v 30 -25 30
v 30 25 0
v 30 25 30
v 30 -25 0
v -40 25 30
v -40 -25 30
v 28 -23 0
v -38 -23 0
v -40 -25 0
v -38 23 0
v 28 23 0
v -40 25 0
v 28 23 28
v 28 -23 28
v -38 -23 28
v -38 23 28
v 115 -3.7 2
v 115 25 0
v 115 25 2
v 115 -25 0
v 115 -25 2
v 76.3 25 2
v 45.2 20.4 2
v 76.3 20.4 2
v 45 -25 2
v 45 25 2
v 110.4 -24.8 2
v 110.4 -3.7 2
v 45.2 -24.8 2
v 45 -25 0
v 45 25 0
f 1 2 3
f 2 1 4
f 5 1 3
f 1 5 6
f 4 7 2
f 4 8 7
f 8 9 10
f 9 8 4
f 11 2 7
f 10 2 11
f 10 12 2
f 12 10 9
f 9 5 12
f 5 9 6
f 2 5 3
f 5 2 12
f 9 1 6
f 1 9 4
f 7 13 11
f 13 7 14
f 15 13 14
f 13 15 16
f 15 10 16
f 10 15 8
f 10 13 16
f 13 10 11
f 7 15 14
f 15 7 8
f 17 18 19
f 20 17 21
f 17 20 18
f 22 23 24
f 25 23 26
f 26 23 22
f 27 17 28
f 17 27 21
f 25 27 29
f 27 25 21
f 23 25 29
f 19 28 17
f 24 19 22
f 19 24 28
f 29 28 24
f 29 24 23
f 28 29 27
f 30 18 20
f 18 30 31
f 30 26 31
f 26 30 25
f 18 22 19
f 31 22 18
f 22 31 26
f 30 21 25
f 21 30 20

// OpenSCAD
// Two-part enclosure for small electronics board
// Part 1: Box (left)
// Part 2: Lid (right, printed upside down)
// Prints together with a 10 mm gap.

// --- Dimensions ---
// Box Outer Dimensions (X x Y x Z)
$box_outer_x = 70;
$box_outer_y = 50;
$box_outer_z = 30;

// Wall and Floor Thickness
$wall_thickness = 2;
$floor_thickness = 2;

// Lid Dimensions
// Plate thickness
$plate_thickness = 2;
// Lip dimensions (height and wall thickness)
$lip_height = 4;
$lip_wall_thickness = 1.5;
// Lip outer size (X x Y)
$lip_outer_x = 65.6;
$lip_outer_y = 45.6;

// Clearance
$clearance = 0.2;

// Gap between parts
$gap = 10;

// --- Configuration ---
// Set global resolution for curved shapes
$fn = 64;

// --- Part 1: The Box ---
// Position: Centered on its own footprint, then shifted left by half gap
// Footprint: $box_outer_x * $box_outer_y
translate([-($gap/2) - ($box_outer_x/2), -($box_outer_y/2), 0])
difference() {
    // Outer Box
    cube([
        $box_outer_x, 
        $box_outer_y, 
        $box_outer_z
    ]);
    
    // Inner Void (to create walls and floor)
    // Inner X = Outer X - 2*Wall
    // Inner Y = Outer Y - 2*Wall
    // Inner Z = Outer Z - Floor (Top is open)
    translate([
        $wall_thickness, 
        $wall_thickness, 
        0
    ])
    cube([
        $box_outer_x - (2 * $wall_thickness),
        $box_outer_y - (2 * $wall_thickness),
        $box_outer_z - $floor_thickness
    ]);
}

// --- Part 2: The Lid ---
// Position: Centered on its own footprint (the Plate), then shifted right by half gap + box width
// Footprint: $box_outer_x * $box_outer_y (70 x 50)
// The lip (65.6 x 45.6) is centered within this plate.
translate([
    $gap + ($box_outer_x/2), 
    -($box_outer_y/2), // FIXED: Center based on Plate Y (50), not Lip Y (45.6)
    0
])
difference() {
    // 1. The Main Plate (70x50x2)
    cube([
        $box_outer_x, // 70
        $box_outer_y, // 50
        $plate_thickness // 2
    ]);
    
    // 2. The Lip Void
    // We need to remove the material inside the lip dimensions to create the hole.
    // Lip Outer: 65.6 x 45.6
    // Lip Wall: 1.5
    // Lip Height: 4
    
    // Calculate Lip Inner Dimensions
    $lip_inner_x = $lip_outer_x - (2 * $lip_wall_thickness);
    $lip_inner_y = $lip_outer_y - (2 * $lip_wall_thickness);
    
    // The void starts at Z = $plate_thickness and goes up by $lip_height
    translate([
        ($lip_outer_x/2) - $lip_wall_thickness, // Center X
        ($lip_outer_y/2) - $lip_wall_thickness, // Center Y
        $plate_thickness // Start at top of plate
    ])
    cube([
        $lip_inner_x,
        $lip_inner_y,
        $lip_height
    ]);
    
    // 3. Cut the Lip Wall Material (to make the hole round/clean and ensure fit)
    // We cut a shape slightly larger than the inner lip dimensions to ensure the 0.2mm clearance is respected
    // and the hole is clean.
    // Target inner size for the hole: Lip Outer - 2*Clearance
    $cut_x = $lip_outer_x - (2 * $clearance);
    $cut_y = $lip_outer_y - (2 * $clearance);
    
    translate([
        ($lip_outer_x/2) - ($cut_x/2),
        ($lip_outer_y/2) - ($cut_y/2),
        $plate_thickness
    ])
    cube([
        $cut_x,
        $cut_y,
        $lip_height + 0.1 // Extend slightly past lip height to ensure clean cut
    ]);
}
